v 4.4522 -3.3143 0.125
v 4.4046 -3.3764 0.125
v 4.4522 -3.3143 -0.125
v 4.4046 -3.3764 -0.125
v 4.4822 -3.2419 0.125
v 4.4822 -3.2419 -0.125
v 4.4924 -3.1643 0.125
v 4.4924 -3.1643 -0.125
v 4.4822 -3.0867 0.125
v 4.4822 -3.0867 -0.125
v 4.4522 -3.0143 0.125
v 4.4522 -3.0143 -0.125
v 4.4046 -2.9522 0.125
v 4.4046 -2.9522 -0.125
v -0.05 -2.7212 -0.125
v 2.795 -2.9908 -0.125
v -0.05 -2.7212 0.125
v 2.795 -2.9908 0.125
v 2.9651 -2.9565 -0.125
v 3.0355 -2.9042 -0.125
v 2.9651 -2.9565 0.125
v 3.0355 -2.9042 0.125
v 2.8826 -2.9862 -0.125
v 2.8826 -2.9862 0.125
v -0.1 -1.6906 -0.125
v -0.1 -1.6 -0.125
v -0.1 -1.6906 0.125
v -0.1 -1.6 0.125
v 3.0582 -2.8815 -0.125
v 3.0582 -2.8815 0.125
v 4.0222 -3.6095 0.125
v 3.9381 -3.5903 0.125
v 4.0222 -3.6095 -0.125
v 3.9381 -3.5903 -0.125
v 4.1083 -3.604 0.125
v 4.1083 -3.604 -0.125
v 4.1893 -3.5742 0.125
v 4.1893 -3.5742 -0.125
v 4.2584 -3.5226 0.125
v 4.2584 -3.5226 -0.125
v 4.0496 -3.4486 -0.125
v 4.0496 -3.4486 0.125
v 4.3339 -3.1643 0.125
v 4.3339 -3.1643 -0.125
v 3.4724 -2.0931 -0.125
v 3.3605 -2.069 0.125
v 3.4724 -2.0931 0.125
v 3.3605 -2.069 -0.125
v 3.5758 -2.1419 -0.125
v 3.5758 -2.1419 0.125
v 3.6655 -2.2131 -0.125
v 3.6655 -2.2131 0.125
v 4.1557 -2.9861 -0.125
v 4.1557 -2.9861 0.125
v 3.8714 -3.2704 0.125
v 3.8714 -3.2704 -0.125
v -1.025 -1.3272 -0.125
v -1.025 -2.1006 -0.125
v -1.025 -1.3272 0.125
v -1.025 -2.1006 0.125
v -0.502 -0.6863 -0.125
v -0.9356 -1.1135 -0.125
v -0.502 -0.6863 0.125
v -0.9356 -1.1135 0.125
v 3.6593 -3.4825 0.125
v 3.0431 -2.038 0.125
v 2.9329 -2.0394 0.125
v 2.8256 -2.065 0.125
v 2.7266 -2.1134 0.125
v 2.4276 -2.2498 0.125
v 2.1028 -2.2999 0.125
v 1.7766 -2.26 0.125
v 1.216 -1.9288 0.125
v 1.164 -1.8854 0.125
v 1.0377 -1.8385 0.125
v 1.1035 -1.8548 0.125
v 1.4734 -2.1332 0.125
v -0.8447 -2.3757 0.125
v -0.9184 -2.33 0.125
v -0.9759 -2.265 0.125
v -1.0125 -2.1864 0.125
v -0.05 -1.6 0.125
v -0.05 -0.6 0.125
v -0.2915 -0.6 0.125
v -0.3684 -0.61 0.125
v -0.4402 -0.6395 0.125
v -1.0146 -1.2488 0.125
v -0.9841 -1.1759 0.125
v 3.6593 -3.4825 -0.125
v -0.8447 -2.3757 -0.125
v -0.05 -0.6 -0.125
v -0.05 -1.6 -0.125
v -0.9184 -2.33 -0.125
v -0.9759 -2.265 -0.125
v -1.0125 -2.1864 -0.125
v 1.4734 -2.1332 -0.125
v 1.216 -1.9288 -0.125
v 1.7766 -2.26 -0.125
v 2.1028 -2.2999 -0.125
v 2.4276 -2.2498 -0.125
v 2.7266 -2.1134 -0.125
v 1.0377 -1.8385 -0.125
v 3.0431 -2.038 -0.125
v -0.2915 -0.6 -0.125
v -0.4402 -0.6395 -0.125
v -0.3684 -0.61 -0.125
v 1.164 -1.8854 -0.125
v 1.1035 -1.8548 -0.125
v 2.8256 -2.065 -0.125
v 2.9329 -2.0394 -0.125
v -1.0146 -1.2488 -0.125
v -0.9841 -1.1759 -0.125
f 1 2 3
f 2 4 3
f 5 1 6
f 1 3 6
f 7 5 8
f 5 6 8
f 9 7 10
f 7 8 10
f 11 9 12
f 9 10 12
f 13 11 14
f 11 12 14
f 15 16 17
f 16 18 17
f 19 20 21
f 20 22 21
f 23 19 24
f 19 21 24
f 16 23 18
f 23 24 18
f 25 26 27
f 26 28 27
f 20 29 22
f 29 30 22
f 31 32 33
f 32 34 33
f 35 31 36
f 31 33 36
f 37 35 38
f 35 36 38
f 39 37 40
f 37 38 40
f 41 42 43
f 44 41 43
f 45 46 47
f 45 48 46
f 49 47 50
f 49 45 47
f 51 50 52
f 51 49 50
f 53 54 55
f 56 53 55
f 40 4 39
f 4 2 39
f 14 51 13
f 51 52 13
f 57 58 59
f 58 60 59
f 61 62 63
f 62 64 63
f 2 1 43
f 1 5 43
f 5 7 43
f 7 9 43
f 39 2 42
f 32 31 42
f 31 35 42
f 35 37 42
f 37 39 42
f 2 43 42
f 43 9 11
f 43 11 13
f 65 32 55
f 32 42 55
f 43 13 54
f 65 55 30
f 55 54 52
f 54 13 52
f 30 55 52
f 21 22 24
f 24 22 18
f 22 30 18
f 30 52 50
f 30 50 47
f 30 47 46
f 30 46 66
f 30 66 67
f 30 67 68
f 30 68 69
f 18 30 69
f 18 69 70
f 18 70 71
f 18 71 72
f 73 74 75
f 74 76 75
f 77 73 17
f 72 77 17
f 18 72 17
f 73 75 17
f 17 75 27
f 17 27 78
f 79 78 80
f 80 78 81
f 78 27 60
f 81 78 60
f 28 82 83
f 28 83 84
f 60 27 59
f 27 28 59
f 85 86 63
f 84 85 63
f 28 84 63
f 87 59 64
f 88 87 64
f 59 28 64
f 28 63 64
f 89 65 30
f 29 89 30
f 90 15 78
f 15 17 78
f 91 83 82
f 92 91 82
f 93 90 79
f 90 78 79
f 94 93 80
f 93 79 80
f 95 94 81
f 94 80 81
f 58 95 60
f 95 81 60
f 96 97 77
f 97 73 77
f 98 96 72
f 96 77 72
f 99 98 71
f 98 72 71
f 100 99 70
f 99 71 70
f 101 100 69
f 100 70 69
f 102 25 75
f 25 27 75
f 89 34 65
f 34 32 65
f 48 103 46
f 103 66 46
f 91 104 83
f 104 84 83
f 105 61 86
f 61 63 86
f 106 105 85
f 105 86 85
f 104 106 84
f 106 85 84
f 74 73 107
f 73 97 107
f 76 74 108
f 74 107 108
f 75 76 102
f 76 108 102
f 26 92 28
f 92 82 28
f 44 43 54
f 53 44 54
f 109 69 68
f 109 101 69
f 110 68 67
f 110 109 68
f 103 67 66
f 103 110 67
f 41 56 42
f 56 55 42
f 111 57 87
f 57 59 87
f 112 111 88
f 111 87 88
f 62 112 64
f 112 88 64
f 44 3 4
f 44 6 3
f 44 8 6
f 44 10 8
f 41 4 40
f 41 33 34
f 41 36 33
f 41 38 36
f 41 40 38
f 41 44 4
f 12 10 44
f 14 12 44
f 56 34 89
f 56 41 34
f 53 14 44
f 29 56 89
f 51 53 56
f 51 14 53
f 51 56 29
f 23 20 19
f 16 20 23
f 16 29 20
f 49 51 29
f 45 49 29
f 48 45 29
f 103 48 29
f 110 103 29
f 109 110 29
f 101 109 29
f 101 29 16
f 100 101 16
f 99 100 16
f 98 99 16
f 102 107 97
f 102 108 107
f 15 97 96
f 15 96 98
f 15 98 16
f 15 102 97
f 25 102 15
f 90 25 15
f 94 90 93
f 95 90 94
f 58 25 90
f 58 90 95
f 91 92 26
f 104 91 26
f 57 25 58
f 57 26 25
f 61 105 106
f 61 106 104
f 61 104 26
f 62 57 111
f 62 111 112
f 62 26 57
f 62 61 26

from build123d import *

# Parameters (mm, degrees)
BOSS_EXTRUDE1_DEPTH = 0.125
FILLET1_R           = 0.3
FILLET2_R           = 0.5


with BuildPart() as part:
    # frame_outline → Boss-Extrude1 (new, symmetric)
    with BuildSketch(Plane.XY):
        with BuildLine():
            Line((-0.05, -0.6), (-0.05, -1.6))
            Line((-0.05, -1.6), (-0.1, -1.6))
            Line((-0.1, -1.6), (-0.1, -1.690631342))
            Line((-0.1, -1.690631342), (1.149530794, -1.853054692))
            ThreePointArc((1.149530794, -1.853054692), (1.967232196, -2.294374324), (2.854868829, -2.019602037))
            Line((2.854868829, -2.019602037), (3.538793019, -2.08639569))
            Line((3.538793019, -2.08639569), (4.616700174, -3.164302846))
            Line((4.616700174, -3.164302846), (4.120311214, -3.660691806))
            Line((4.120311214, -3.660691806), (3.659277593, -3.482500897))
            Line((3.659277593, -3.482500897), (3.058236829, -2.881460133))
            Line((3.058236829, -2.881460133), (2.935621241, -3.004075721))
            Line((2.935621241, -3.004075721), (-0.05, -2.721174788))
            Line((-0.05, -2.721174788), (-1.025048244, -2.297249495))
            Line((-1.025048244, -2.297249495), (-1.025048244, -1.201582707))
            Line((-1.025048244, -1.201582707), (-0.414440871, -0.6))
            Line((-0.414440871, -0.6), (-0.05, -0.6))
        make_face()
        Polygon((3.871409627, -3.270368863), (4.049600536, -3.448559772), (4.333857462, -3.164302846), (4.155666553, -2.986111937), align=None, mode=Mode.SUBTRACT)
    extrude(amount=BOSS_EXTRUDE1_DEPTH, both=True)

    # Fillet1
    fillet1_edges = [part.edges().sort_by_distance(p)[0] for p in [
        (-1.025048244, -1.201582707, 0),
        (-0.414440871, -0.6, 0),
        (1.149530794, -1.853054692, 0),
        (4.616700174, -3.164302846, 0),
        (4.120311214, -3.660691806, 0),
        (2.935621241, -3.004075721, 0),
        (-1.025048244, -2.297249495, 0),
    ]]
    fillet(fillet1_edges, radius=FILLET1_R)

    # Fillet2
    fillet2_edges = [part.edges().sort_by_distance(p)[0] for p in [
        (2.854868829, -2.019602037, 0),
        (3.538793019, -2.08639569, 0),
    ]]
    fillet(fillet2_edges, radius=FILLET2_R)


solid = part.part
